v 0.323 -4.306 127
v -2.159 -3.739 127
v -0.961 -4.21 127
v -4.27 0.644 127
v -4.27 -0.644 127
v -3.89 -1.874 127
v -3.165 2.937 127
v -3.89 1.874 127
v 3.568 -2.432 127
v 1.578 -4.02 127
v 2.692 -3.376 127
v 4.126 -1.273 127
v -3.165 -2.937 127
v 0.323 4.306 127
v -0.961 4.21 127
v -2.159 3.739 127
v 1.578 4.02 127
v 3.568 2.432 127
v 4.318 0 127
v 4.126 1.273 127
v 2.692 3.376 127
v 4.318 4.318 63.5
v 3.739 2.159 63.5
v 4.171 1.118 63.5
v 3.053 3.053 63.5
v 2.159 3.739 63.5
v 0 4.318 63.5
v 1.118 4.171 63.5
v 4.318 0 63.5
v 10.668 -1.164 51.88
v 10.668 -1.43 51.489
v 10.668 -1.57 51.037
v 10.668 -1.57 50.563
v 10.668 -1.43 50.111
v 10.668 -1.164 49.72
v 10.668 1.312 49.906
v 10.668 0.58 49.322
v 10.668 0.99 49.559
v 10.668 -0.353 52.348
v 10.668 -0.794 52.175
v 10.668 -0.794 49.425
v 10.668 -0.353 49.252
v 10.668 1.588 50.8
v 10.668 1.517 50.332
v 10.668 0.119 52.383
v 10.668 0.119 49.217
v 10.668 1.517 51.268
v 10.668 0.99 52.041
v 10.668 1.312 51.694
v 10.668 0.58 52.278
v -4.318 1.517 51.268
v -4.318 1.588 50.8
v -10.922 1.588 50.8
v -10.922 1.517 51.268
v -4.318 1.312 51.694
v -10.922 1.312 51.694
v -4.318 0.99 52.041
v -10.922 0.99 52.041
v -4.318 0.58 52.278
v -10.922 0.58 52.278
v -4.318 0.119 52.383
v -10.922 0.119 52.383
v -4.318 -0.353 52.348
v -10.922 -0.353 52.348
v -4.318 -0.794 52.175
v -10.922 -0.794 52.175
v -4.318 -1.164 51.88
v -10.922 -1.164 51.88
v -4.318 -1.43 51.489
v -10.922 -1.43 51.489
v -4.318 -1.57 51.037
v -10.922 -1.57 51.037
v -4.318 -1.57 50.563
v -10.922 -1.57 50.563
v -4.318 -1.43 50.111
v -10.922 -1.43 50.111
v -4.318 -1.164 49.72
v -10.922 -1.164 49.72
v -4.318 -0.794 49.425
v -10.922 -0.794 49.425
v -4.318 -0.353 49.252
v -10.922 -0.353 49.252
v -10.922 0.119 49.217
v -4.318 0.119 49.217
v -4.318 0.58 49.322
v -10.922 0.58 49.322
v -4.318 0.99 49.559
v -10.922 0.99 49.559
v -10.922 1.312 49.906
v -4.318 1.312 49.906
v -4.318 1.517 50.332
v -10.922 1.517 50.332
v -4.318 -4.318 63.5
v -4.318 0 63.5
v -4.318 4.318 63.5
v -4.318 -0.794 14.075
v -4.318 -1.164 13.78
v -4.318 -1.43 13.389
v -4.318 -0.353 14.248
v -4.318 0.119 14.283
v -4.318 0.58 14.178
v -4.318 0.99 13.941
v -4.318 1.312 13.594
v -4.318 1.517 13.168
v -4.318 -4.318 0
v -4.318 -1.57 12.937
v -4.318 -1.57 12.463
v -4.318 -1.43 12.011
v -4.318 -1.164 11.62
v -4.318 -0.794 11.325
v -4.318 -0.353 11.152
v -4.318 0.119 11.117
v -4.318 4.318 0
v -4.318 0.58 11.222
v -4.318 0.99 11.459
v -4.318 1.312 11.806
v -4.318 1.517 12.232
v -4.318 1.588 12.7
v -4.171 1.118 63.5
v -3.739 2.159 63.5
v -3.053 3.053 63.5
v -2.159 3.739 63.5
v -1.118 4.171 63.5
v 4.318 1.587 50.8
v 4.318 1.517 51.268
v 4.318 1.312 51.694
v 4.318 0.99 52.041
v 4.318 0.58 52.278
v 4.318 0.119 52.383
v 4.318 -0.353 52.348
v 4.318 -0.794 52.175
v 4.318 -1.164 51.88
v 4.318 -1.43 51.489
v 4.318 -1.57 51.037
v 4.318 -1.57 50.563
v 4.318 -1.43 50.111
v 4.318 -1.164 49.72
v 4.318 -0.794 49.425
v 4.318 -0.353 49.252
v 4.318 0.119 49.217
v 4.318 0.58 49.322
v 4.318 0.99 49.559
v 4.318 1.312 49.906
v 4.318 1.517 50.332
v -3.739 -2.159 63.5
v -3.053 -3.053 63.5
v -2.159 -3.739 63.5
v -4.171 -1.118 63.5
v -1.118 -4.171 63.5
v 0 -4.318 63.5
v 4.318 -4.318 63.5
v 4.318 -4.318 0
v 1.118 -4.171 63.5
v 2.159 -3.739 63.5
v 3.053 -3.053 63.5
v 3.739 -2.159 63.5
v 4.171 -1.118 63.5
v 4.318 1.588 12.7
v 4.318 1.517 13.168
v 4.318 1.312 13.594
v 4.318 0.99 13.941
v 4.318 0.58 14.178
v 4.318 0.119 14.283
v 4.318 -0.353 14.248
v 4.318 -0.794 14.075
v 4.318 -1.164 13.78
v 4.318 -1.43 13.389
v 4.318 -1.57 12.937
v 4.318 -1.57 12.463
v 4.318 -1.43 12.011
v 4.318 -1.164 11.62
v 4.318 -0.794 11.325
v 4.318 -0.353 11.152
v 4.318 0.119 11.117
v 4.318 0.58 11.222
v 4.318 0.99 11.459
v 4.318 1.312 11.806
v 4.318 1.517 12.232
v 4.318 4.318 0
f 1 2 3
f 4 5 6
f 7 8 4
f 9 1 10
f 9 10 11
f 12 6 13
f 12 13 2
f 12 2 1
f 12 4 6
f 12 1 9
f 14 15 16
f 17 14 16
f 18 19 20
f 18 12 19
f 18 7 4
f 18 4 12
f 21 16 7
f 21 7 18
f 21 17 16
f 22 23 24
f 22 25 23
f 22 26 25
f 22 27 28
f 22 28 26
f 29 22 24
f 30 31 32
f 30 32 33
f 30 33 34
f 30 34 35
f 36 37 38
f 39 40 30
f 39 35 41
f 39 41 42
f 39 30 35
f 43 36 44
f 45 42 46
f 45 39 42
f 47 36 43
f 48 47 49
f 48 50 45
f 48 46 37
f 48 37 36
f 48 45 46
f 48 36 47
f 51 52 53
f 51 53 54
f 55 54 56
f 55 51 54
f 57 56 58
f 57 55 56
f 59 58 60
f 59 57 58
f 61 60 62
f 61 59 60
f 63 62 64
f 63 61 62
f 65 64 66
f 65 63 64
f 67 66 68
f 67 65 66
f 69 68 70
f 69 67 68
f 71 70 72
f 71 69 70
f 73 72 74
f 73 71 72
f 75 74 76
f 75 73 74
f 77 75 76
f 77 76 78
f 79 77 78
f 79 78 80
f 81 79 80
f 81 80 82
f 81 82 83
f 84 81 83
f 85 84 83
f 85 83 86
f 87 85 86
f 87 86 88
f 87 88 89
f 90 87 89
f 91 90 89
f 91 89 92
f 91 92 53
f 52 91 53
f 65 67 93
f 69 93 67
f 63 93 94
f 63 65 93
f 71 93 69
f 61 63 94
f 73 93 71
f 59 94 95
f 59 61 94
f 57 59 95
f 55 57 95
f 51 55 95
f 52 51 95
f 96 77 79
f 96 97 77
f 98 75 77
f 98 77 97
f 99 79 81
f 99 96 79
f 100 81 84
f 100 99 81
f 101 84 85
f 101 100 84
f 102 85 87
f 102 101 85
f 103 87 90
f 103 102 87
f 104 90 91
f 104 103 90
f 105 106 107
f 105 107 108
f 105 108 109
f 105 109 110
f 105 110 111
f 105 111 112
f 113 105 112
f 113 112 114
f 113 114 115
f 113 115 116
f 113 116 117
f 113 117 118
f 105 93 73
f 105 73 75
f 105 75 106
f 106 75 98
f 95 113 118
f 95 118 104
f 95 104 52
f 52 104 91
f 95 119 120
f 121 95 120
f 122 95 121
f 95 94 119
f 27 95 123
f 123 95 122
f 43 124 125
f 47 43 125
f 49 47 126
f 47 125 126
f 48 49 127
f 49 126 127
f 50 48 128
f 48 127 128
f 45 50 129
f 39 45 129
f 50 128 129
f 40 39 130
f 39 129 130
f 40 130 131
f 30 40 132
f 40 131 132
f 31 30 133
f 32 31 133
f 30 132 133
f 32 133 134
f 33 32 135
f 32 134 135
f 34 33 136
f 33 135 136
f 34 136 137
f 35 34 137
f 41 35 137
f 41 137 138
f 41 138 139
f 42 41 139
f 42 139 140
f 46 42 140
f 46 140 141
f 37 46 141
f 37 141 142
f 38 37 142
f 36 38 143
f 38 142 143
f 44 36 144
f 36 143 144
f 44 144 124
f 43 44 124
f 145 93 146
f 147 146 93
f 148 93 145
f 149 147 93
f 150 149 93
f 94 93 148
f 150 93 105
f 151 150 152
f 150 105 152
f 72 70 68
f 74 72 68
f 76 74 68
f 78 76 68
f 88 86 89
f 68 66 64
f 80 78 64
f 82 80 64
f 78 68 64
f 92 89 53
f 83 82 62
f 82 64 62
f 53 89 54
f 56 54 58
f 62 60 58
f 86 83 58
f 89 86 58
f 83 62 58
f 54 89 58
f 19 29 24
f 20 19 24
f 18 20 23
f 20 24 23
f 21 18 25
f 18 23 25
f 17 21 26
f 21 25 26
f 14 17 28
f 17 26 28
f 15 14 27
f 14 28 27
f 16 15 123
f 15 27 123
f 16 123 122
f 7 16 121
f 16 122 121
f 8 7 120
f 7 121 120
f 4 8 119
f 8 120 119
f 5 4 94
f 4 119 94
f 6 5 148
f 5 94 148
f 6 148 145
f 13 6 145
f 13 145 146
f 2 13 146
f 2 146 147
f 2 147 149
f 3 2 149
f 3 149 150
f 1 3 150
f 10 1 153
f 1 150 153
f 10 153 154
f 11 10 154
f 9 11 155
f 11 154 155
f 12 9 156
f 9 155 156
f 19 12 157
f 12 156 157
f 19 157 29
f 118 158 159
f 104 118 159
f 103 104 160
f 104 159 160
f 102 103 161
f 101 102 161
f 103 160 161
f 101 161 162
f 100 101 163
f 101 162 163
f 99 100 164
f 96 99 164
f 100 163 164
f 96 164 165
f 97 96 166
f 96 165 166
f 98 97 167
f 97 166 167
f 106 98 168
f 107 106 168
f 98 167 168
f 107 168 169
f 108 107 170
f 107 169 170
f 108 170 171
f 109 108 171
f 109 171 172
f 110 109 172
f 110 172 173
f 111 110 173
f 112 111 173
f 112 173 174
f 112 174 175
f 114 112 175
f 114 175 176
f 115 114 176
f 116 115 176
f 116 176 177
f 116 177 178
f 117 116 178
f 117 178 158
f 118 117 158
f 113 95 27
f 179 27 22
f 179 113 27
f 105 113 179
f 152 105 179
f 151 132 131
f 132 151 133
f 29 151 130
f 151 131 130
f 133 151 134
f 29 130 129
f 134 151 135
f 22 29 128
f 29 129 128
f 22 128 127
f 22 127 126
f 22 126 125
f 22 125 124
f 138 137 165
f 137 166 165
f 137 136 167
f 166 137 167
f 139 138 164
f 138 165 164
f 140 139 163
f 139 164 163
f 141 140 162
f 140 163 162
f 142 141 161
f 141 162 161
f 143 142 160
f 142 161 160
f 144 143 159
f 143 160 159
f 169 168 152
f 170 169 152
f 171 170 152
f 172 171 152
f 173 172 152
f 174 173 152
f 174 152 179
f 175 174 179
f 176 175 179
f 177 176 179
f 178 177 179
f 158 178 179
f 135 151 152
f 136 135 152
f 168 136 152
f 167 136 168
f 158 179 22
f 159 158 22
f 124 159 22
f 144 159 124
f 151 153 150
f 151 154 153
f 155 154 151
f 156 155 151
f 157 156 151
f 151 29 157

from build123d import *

# Parameters (mm, degrees)
F0_W          = 8.636
F0_H          = 8.636
F1_DEPTH      = 63.5
F2_R          = 4.318
F3_DEPTH      = 63.5
F4_R          = 1.5875
F5_DEPTH      = 25.4
F6_R          = 1.5875
F7_DEPTH      = 6.35
F7_DEPTH_BACK = 15.24


with BuildPart() as f1:
    # F0 (on Top) → F1 (new body)
    with BuildSketch(Plane.XY):
        Rectangle(F0_W, F0_H)
    extrude(amount=F1_DEPTH)

    # F2 (on face) → F3 (join)
    with BuildSketch(Plane.XY.offset(63.5)):
        Circle(F2_R)
    extrude(amount=F3_DEPTH)

    # F4 (on face) → F5 (cut)
    with BuildSketch(Plane.YZ.offset(4.318)):
        with Locations((0, 12.7)):
            Circle(F4_R)
    extrude(amount=-F5_DEPTH, mode=Mode.SUBTRACT)

    # F6 (on face) → F7 (join, two sides)
    with BuildSketch(Plane.YZ.offset(4.318)) as f7_sk:
        with Locations((0, 50.8)):
            Circle(F6_R)
    extrude(amount=F7_DEPTH)
    extrude(f7_sk.sketch, amount=-F7_DEPTH_BACK)


solid = f1.part
